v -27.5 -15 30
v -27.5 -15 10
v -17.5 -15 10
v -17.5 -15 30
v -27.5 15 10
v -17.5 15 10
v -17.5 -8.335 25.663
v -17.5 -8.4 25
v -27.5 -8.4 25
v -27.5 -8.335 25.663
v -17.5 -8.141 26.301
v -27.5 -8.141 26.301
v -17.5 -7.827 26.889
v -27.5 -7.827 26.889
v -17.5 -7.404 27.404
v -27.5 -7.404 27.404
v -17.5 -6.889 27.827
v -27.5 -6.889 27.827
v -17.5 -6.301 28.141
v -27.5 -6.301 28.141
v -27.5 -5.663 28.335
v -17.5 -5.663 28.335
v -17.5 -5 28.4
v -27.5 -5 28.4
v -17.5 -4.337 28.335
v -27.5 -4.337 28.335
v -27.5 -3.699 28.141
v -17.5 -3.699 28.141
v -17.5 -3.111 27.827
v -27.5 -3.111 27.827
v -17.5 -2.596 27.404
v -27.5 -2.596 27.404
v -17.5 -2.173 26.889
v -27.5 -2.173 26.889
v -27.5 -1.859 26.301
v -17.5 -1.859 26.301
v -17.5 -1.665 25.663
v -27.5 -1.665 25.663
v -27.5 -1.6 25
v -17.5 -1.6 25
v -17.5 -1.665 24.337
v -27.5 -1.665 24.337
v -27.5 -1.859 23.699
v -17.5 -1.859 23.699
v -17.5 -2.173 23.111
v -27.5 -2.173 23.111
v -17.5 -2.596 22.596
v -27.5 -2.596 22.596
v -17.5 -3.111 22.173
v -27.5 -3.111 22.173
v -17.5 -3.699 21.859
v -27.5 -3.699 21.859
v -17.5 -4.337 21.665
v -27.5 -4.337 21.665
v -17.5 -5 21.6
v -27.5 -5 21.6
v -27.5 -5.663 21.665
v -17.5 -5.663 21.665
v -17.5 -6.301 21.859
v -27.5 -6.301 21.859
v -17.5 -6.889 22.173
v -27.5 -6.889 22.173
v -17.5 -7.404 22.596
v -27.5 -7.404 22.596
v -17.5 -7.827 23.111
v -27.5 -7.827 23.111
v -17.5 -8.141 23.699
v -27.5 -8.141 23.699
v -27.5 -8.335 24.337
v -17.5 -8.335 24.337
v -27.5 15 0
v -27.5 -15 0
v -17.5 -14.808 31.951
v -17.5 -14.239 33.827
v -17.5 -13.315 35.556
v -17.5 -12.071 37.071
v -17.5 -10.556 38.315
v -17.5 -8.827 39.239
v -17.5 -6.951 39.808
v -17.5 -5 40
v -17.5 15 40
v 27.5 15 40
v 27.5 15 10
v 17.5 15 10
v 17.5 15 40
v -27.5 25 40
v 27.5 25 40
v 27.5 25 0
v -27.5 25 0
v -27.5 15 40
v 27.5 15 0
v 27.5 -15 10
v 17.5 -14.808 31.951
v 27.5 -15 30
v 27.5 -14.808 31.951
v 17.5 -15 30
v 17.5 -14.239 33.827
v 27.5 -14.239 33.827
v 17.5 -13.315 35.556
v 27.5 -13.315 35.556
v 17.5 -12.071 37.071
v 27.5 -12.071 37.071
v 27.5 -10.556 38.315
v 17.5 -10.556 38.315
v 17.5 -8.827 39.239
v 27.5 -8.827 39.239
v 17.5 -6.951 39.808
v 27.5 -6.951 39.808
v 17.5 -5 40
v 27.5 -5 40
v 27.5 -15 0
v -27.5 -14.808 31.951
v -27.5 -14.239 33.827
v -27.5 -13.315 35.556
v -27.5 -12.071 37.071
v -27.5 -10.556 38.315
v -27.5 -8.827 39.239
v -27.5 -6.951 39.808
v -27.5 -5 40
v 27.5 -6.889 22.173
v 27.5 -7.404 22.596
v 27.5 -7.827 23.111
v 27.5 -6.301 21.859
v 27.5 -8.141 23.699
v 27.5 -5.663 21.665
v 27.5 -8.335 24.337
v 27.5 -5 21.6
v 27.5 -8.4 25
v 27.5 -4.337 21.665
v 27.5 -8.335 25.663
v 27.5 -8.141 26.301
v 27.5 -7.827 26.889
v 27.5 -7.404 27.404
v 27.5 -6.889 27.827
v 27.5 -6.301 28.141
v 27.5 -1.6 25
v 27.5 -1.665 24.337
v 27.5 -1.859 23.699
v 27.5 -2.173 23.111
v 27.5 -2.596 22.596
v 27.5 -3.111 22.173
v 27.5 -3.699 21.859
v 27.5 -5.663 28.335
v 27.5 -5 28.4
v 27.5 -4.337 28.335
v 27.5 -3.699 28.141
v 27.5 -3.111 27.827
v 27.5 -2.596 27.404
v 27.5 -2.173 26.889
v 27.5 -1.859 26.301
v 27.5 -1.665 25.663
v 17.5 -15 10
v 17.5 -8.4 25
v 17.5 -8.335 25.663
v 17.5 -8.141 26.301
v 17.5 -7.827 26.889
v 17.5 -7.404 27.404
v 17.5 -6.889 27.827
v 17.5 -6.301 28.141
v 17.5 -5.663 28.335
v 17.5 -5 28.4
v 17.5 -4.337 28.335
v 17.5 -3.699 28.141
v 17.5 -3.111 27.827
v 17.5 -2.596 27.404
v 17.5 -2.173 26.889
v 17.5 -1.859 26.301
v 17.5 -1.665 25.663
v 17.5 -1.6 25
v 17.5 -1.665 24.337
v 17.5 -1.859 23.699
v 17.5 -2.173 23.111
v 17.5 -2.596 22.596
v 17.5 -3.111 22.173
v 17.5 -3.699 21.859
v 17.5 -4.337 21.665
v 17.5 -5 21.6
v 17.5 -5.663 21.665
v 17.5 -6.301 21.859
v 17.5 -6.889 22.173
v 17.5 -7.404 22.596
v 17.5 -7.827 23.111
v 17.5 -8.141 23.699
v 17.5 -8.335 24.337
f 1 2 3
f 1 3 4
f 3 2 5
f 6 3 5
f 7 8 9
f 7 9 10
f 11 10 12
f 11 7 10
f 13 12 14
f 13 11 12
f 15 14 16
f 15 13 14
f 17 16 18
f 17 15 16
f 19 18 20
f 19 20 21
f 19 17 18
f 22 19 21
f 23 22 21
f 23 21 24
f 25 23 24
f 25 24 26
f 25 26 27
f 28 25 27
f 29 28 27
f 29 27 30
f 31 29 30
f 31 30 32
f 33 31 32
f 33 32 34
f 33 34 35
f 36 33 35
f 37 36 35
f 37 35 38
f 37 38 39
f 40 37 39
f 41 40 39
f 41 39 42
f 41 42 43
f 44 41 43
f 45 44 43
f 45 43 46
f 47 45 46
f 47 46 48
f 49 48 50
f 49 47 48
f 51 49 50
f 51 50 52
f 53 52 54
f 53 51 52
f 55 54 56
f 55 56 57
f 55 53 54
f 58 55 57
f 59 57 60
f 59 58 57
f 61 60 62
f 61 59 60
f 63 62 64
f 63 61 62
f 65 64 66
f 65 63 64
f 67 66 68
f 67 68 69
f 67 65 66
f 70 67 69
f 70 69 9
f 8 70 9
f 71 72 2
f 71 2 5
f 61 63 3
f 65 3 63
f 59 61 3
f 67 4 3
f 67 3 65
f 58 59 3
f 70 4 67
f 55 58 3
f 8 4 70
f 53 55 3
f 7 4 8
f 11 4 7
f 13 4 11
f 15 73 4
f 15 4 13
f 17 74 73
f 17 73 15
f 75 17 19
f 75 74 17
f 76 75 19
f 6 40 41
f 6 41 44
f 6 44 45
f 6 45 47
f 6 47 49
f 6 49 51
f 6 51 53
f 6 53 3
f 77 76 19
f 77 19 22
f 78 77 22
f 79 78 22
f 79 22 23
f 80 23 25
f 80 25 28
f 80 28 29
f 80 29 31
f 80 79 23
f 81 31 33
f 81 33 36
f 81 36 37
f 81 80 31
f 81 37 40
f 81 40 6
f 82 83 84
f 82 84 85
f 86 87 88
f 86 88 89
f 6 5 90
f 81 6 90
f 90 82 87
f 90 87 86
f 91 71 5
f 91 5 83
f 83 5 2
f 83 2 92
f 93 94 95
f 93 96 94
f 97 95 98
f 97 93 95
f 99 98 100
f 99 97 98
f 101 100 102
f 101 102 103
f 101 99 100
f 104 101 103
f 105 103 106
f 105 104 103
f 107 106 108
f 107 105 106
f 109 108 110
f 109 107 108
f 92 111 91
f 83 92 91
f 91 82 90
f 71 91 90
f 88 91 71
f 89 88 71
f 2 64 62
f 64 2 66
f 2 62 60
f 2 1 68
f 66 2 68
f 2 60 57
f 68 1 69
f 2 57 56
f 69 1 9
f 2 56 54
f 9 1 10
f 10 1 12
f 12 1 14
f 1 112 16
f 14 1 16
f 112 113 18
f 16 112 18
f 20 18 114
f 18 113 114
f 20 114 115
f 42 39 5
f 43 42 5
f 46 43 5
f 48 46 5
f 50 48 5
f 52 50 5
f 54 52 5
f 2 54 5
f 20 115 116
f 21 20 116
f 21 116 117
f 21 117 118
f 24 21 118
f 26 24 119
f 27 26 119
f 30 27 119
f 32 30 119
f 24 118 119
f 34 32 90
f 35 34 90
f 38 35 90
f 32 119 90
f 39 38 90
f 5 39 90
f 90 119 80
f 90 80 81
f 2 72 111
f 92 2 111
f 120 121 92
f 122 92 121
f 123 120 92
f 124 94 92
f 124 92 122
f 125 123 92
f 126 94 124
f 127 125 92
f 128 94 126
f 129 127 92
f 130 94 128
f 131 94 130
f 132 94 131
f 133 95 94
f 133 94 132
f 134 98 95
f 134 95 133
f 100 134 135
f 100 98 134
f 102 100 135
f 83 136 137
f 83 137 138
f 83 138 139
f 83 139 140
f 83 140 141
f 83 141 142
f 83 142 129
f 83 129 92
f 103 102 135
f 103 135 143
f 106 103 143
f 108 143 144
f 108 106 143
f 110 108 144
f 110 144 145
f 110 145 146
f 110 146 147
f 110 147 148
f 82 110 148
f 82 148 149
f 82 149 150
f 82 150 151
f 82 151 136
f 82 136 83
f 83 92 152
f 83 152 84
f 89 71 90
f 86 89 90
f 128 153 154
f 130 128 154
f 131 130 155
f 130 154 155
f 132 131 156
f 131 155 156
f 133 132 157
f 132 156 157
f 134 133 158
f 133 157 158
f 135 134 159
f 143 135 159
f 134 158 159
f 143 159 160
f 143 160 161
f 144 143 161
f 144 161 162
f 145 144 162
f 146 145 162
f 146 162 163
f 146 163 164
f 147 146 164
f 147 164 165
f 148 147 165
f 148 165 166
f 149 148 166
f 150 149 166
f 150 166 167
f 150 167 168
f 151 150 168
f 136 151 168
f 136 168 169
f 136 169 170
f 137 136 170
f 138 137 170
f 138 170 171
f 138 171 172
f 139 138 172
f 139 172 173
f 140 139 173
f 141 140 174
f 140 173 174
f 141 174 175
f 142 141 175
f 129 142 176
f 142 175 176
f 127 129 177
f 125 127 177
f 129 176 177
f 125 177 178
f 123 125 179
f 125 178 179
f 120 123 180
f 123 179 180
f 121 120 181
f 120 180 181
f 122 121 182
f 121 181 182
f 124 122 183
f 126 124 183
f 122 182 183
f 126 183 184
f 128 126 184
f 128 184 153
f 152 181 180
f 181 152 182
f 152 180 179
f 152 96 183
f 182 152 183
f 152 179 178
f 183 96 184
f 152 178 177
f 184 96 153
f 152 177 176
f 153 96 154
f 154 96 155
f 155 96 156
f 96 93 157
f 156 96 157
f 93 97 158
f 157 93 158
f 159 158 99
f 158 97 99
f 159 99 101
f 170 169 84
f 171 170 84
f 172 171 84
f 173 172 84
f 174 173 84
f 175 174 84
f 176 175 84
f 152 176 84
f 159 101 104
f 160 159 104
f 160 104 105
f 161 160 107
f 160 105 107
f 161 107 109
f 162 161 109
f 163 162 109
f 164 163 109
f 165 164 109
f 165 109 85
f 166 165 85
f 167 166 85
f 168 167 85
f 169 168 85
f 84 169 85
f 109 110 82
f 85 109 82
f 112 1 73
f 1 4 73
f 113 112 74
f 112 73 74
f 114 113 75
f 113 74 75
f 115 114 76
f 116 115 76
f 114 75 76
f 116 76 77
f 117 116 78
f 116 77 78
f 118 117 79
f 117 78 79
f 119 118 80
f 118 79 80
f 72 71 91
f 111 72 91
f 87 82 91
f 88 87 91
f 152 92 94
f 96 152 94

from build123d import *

# Parameters (mm, degrees)
F0_W     = 55
F0_H     = 30
F1_DEPTH = 10
F2_W     = 55
F2_H     = 30
F2_H_2   = 10
F3_DEPTH = 10
F4_W     = 30
F4_H     = 30
F5_DEPTH = 10
F6_R     = 10
F8_D     = 6.8


with BuildPart() as f1:
    # F0 (on Top) → F1 (new body)
    with BuildSketch(Plane.XY):
        Rectangle(F0_W, F0_H)
    extrude(amount=F1_DEPTH)


with BuildPart() as f3:
    # F2 (on face) → F3 (new body)
    with BuildSketch(Plane(origin=(0, 15, 0), x_dir=(-1, 0, 0), z_dir=(0, 1, 0))):
        with Locations((0, 25)):
            Rectangle(F2_W, F2_H)
        with Locations((0, 5)):
            Rectangle(F2_W, F2_H_2)
    extrude(amount=F3_DEPTH)


with BuildPart() as f5:
    # F4 (on face) → F5 (new body)
    with BuildSketch(Plane.YZ.offset(27.5)):
        with Locations((0, 25)):
            Rectangle(F4_W, F4_H)
    extrude(amount=-F5_DEPTH)

    # F6
    f6_edges = [f5.edges().sort_by_distance(p)[0] for p in [
        (22.5, -15, 40),
    ]]
    fillet(f6_edges, radius=F6_R)

    # F8 (through all)
    with Locations(Plane.YZ.offset(27.5)):
        with Locations((-5, 25)):
            Hole(F8_D / 2)


with BuildPart() as f9_1:
    # F9: instance of F5
    add(f5.part.mirror(Plane.YZ))


solid = Compound([f1.part, f3.part, f5.part, f9_1.part])
